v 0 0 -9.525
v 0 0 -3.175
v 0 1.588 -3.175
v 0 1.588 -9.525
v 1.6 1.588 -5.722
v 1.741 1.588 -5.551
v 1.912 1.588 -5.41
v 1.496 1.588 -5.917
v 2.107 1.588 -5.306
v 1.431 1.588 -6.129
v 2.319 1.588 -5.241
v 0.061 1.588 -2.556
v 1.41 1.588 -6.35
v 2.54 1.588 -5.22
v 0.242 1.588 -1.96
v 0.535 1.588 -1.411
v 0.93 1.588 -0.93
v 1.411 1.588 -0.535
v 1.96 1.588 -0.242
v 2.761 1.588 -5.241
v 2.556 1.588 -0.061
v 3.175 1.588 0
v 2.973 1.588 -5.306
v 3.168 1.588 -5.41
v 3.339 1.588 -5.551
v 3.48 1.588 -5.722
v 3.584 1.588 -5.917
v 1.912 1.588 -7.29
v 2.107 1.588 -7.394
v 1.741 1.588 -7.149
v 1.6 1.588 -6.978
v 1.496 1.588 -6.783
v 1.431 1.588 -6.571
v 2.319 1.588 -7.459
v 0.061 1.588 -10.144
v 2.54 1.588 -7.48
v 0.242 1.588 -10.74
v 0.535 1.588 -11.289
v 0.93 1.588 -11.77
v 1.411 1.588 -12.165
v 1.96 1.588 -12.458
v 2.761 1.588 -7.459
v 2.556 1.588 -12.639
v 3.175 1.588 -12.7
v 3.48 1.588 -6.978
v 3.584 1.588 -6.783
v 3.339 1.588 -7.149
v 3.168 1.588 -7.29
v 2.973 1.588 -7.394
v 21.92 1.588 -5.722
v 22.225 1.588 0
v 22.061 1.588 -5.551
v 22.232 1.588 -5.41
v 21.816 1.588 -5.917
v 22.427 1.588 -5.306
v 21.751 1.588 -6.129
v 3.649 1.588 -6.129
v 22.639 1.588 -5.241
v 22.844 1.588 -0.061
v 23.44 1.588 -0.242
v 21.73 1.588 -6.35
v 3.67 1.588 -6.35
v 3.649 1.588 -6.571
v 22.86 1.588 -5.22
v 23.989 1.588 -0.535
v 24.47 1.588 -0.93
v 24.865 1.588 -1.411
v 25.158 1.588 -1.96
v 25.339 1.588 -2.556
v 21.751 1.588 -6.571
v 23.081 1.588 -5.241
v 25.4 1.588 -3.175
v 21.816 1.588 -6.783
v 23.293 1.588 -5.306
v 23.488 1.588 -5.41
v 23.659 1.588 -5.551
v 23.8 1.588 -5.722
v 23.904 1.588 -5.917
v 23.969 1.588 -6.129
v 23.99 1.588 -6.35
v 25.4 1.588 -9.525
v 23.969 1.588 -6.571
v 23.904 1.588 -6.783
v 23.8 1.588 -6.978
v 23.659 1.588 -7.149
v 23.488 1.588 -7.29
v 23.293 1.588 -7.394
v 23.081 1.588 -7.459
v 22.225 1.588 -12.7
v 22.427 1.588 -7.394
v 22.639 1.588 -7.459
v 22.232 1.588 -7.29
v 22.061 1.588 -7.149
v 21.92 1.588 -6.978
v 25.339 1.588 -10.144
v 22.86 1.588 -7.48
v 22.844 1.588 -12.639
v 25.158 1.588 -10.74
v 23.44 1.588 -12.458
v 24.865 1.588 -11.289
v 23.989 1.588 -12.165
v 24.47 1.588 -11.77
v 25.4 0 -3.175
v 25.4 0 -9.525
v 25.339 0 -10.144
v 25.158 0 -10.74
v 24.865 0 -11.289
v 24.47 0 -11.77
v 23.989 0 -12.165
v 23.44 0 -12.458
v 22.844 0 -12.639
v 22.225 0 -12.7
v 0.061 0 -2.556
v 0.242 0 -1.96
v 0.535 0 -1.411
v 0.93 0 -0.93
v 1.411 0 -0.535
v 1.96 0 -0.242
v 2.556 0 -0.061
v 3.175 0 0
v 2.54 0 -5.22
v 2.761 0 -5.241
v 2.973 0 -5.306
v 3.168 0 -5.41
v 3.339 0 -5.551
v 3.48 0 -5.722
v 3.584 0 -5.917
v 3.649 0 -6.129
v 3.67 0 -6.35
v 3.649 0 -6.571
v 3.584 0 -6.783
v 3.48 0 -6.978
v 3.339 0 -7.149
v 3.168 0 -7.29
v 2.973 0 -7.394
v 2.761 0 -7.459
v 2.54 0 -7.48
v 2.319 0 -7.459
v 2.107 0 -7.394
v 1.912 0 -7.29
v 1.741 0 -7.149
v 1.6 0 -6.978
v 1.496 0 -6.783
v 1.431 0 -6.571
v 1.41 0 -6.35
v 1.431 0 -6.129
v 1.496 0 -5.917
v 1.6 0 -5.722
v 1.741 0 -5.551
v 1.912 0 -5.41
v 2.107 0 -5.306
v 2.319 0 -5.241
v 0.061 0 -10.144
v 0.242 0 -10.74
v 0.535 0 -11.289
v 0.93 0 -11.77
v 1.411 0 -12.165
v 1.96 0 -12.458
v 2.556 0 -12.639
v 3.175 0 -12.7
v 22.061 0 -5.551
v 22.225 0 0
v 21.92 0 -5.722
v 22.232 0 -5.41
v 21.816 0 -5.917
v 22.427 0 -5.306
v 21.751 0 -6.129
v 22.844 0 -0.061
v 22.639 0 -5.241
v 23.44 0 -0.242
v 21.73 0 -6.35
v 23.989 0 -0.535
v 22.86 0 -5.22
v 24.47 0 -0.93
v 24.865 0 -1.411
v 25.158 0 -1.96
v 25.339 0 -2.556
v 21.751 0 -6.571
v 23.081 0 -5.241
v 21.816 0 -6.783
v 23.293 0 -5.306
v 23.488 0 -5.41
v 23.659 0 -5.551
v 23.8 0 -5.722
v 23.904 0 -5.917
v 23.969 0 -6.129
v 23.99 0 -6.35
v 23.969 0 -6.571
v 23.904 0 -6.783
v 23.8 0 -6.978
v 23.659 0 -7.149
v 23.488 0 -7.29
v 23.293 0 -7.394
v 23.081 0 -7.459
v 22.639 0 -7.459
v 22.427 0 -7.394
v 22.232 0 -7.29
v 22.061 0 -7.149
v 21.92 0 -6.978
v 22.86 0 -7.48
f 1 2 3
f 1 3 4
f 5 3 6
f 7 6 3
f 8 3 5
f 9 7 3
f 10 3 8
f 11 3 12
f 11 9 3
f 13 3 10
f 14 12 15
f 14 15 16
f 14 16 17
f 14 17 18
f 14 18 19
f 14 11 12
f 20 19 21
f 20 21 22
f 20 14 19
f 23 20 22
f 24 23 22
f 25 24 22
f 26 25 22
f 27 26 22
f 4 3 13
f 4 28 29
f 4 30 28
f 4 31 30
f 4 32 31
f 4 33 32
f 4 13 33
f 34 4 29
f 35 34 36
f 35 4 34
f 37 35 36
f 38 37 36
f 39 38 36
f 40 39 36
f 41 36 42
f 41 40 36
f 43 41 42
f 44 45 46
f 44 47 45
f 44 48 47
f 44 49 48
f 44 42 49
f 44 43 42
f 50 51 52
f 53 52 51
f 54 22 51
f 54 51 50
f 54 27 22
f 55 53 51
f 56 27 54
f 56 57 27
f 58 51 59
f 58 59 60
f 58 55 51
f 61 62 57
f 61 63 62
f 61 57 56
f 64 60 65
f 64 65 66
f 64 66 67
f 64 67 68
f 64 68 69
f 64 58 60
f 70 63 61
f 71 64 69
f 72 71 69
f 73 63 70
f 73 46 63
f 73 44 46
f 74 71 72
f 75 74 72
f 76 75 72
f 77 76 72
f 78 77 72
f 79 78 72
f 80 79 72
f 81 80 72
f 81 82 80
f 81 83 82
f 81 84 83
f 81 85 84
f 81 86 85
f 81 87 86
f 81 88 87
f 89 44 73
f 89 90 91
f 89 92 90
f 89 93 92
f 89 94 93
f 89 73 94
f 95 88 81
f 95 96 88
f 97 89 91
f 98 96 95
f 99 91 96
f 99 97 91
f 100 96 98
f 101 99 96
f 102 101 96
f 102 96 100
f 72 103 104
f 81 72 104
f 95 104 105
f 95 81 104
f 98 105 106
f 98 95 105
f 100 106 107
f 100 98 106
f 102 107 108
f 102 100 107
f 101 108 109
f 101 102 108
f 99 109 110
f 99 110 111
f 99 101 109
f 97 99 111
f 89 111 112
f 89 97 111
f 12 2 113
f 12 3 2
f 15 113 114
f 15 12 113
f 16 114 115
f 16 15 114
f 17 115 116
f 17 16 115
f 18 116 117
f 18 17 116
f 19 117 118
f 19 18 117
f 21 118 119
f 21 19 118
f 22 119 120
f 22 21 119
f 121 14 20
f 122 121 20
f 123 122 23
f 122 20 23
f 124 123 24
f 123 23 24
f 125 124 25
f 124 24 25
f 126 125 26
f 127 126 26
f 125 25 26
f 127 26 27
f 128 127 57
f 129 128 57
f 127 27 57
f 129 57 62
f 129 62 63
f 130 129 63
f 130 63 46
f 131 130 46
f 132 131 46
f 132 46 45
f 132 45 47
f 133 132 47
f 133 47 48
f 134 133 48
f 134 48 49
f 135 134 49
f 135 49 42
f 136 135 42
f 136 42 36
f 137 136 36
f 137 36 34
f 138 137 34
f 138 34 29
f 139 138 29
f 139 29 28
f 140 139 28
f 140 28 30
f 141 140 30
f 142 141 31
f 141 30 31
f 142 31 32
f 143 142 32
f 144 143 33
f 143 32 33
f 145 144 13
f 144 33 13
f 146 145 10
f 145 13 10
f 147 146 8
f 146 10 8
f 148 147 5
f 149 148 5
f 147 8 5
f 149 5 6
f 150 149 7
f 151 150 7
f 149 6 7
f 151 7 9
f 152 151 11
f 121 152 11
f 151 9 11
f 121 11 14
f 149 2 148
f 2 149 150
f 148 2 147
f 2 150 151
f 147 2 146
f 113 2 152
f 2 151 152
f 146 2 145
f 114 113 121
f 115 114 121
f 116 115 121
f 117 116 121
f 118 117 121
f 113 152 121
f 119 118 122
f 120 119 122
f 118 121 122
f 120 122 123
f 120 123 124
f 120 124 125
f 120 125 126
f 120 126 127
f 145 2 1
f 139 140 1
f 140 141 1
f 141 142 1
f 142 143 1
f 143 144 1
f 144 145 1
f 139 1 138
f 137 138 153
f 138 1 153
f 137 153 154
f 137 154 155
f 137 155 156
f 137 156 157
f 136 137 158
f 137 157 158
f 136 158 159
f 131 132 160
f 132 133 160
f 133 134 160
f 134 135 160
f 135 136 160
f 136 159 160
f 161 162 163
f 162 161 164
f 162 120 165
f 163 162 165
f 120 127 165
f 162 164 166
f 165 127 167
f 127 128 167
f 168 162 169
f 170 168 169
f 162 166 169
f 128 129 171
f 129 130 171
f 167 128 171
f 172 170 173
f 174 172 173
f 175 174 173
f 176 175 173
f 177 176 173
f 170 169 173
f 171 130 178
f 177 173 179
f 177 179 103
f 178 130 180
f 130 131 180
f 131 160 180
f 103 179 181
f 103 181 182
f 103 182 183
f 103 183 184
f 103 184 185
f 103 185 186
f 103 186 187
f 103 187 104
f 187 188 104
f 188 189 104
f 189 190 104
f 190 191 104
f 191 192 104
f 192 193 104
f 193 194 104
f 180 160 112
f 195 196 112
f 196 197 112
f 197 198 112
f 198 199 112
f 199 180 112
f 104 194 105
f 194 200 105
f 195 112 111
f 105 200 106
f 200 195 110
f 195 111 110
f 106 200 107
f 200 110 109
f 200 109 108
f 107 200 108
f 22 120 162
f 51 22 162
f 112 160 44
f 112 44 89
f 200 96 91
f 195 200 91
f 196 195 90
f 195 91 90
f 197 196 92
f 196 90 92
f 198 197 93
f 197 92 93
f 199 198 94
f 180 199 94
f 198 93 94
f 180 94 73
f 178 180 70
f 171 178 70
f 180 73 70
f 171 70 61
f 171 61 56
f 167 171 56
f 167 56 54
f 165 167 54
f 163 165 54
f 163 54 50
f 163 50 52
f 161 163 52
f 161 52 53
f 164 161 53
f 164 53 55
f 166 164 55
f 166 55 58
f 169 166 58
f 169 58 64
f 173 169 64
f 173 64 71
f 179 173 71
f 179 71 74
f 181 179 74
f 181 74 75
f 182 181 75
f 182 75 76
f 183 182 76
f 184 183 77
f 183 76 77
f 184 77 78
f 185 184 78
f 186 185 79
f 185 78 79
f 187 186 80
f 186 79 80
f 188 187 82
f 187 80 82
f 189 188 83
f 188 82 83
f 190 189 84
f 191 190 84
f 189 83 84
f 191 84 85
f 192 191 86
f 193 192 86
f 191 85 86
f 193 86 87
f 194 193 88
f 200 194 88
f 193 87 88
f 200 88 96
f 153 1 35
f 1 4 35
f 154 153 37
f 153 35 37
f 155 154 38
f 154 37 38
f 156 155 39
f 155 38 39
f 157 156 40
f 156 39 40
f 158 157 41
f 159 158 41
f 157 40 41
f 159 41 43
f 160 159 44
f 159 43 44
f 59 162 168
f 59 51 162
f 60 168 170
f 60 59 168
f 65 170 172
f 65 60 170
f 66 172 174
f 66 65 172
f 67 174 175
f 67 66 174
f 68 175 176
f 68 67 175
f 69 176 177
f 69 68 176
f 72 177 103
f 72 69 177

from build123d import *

# Parameters (mm, degrees)
SKETCH1_W           = 25.4
SKETCH1_H           = 12.7
BOSS_EXTRUDE1_DEPTH = 1.5875
FILLET1_R           = 3.175
SKETCH2_R           = 1.1303
CUT_EXTRUDE1_DEPTH  = 29.442400677


with BuildPart() as part:
    # Sketch1 → Boss-Extrude1 (new body)
    with BuildSketch(Plane(origin=(0, 0, 0), x_dir=(1, 0, 0), z_dir=(0, 1, 0))):
        with Locations((12.7, 6.35)):
            Rectangle(SKETCH1_W, SKETCH1_H)
    extrude(amount=BOSS_EXTRUDE1_DEPTH)

    # Fillet1
    fillet1_edges = [part.edges().sort_by_distance(p)[0] for p in [
        (0, 0.79375, -12.7),
        (25.4, 0.79375, -12.7),
        (25.4, 0.79375, 0),
        (0, 0.79375, 0),
    ]]
    fillet(fillet1_edges, radius=FILLET1_R)

    # Sketch2 → Cut-Extrude1 (cut, through all)
    with BuildSketch(Plane(origin=(0, 1.5875, 0), x_dir=(1, 0, 0), z_dir=(0, 1, 0))):
        with Locations(Location((2.54, 6.35, 0), (0, 0, 270))):
            Circle(SKETCH2_R)
        with Locations(Location((22.86, 6.35, 0), (0, 0, 90))):
            Circle(SKETCH2_R)
    extrude(amount=-CUT_EXTRUDE1_DEPTH, mode=Mode.SUBTRACT)


solid = part.part
